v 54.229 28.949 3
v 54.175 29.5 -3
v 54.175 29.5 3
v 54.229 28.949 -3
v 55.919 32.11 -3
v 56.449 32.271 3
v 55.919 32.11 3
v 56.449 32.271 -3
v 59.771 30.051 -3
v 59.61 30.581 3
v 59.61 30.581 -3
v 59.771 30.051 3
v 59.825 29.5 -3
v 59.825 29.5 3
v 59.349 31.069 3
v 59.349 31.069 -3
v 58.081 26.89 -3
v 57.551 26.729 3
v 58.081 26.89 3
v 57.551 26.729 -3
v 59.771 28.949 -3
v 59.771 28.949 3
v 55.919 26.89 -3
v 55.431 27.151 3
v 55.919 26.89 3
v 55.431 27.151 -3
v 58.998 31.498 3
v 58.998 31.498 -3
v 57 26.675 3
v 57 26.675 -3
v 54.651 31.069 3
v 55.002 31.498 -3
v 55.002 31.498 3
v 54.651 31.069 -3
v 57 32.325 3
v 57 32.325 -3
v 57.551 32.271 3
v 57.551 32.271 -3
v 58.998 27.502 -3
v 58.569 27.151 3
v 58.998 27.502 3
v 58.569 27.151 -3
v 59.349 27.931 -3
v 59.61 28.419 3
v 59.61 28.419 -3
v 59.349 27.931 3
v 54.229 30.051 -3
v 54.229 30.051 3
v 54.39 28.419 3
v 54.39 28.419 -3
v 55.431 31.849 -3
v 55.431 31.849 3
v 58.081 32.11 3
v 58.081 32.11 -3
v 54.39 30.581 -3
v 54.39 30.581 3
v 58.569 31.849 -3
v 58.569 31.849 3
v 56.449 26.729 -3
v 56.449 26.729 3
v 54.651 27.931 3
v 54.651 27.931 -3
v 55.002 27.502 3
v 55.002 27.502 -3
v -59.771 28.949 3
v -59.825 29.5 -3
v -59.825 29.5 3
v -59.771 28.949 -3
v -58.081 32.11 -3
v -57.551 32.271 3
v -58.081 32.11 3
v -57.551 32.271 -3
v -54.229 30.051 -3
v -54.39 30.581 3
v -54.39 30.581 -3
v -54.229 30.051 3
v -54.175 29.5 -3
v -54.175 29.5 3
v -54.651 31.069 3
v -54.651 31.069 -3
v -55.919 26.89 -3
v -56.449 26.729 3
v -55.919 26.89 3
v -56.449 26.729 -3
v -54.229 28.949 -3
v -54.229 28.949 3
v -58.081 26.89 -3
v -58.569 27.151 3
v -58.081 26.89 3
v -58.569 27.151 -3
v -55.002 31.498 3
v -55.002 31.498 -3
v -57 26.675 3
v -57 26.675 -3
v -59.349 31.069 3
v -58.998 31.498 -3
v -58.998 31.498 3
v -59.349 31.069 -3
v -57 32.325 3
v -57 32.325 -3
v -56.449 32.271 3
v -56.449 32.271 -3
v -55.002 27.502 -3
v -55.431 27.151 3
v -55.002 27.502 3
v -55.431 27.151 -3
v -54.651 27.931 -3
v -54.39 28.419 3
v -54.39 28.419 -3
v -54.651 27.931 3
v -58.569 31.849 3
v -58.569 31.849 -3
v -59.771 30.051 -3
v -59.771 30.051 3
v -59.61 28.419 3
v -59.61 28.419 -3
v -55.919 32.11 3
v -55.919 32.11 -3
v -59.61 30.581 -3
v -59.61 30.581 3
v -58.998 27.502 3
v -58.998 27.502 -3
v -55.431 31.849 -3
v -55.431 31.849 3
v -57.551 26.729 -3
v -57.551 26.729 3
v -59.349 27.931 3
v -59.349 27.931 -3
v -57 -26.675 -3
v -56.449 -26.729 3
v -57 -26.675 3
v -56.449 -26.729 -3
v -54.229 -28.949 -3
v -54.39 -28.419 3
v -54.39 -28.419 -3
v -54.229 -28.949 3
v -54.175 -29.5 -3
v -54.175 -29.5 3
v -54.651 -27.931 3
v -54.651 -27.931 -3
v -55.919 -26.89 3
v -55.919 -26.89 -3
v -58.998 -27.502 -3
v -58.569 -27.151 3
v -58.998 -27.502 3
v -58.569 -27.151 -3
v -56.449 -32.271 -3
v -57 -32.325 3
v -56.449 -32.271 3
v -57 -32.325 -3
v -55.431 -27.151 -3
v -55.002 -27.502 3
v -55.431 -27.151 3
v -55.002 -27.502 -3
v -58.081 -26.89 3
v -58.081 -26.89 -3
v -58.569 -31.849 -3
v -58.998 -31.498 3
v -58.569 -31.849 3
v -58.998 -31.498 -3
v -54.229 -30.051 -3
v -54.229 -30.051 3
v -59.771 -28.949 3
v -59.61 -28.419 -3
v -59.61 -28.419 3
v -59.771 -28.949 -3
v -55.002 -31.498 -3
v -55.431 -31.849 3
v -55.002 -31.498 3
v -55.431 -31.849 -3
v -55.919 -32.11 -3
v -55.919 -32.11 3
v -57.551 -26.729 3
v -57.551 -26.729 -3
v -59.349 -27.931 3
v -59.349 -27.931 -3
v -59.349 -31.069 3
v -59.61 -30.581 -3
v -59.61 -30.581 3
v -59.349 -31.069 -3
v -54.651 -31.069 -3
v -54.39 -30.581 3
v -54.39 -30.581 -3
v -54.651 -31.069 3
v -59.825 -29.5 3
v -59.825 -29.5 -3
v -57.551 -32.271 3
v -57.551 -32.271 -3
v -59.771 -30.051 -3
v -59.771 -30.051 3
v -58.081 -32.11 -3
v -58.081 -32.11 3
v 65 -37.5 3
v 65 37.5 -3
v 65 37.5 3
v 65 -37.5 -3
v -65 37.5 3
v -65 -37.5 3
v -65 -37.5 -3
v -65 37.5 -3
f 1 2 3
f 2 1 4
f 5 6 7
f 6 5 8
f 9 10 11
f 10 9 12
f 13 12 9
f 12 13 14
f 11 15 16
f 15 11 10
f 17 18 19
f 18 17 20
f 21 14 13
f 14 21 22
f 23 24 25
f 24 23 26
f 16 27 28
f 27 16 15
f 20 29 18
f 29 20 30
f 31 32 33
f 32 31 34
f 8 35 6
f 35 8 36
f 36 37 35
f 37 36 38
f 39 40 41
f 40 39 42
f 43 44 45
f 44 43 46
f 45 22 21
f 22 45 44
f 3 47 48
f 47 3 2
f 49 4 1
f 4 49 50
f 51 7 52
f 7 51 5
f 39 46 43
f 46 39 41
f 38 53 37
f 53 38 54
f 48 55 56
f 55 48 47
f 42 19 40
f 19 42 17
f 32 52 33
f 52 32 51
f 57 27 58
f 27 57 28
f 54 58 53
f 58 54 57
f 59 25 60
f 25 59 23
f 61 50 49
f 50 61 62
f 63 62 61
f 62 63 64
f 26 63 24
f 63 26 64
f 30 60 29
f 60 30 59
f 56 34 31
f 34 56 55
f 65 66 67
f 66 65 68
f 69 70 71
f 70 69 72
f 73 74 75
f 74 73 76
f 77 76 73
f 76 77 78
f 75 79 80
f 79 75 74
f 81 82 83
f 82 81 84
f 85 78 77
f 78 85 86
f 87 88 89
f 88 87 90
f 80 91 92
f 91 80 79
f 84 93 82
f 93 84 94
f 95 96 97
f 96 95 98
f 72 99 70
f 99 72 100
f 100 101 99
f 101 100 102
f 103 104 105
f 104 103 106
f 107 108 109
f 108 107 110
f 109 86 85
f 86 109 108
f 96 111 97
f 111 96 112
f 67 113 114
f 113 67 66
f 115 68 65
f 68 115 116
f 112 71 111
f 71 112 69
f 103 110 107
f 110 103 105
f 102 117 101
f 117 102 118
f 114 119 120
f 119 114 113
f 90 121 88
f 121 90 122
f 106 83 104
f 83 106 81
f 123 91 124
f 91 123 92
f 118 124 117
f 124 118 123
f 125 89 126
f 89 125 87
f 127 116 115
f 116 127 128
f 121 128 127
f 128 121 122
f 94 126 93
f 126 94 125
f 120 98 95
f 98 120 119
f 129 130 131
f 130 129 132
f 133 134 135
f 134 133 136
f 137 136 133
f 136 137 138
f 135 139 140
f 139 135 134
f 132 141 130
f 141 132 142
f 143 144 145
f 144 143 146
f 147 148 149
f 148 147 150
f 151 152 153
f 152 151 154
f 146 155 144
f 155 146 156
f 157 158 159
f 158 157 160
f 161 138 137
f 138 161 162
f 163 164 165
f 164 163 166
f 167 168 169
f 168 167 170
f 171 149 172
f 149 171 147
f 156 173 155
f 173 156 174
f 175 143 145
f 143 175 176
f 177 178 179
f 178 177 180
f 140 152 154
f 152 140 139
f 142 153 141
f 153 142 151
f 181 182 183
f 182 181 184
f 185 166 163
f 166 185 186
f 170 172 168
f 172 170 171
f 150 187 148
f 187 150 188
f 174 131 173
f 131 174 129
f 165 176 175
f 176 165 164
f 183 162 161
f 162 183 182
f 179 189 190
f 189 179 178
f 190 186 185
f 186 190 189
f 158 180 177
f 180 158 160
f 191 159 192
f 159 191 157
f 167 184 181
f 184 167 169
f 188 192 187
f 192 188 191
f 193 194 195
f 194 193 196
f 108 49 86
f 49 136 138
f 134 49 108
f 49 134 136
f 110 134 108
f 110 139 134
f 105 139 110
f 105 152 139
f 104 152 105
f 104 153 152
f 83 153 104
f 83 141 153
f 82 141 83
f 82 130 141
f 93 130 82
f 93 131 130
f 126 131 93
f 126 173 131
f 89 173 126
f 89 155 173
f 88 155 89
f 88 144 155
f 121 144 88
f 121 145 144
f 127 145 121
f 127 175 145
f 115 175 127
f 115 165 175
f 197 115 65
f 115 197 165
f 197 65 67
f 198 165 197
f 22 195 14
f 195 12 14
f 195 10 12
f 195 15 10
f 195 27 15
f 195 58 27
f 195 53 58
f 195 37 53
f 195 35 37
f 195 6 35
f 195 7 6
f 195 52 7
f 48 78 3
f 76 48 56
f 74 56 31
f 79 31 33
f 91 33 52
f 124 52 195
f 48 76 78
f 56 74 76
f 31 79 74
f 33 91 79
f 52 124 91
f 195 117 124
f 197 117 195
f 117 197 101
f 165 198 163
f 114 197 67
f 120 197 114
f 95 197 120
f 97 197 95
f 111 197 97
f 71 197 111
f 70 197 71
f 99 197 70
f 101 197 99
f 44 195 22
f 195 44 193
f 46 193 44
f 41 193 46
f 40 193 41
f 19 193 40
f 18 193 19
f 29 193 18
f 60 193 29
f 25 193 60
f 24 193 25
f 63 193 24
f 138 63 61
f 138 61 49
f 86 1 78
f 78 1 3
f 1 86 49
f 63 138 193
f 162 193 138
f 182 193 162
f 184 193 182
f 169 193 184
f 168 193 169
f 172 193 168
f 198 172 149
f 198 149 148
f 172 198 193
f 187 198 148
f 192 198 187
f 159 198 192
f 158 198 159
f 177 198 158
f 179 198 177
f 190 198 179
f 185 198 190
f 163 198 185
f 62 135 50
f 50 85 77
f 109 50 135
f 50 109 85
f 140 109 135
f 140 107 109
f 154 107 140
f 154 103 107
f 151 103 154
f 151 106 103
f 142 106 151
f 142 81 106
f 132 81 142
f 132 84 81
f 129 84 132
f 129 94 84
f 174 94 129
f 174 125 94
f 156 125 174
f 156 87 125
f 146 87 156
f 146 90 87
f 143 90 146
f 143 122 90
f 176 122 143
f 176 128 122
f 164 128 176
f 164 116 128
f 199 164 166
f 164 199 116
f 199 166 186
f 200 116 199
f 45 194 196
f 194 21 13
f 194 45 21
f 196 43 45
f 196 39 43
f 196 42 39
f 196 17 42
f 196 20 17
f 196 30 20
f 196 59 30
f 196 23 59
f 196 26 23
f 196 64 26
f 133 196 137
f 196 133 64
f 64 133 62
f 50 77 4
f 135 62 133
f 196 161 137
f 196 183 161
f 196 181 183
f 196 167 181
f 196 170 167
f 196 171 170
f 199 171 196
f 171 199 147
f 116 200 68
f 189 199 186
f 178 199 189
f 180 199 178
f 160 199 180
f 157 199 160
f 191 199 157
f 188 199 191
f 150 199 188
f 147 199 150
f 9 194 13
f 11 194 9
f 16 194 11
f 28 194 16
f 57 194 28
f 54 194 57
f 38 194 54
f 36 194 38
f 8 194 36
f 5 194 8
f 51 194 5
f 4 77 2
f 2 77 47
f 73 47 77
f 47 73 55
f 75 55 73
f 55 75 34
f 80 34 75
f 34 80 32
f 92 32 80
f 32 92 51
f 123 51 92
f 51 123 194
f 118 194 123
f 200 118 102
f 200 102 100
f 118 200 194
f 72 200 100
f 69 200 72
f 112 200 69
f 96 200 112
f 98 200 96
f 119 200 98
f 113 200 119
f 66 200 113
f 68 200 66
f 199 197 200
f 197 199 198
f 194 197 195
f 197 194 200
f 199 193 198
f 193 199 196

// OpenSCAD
$fn = 32;

// ----------------------------------------------------------------------
// Corner plate 130 x 75 x 6
// 3 holes, centres taken from the edge offset
// ----------------------------------------------------------------------

// --- parameters (mm) ---
plate = [130, 75, 6];    // overall size (x, y, z)
holes = 3;               // number of holes the drawing asks for
bore_d = 5.5;            // nominal hole diameter from the drawing
print_allowance = 0.15;  // clearance added for printing
edge = 8;                // hole centre offset from the plate edge

// --- derived feature positions (mm) ---
hole_d = bore_d + print_allowance;  // = 5.65   hole diameter as printed
corner_x = plate[0] / 2 - edge;     // = 57   corner hole X
corner_y = plate[1] / 2 - edge;     // = 29.5   corner hole Y
feature_centers = [
  [corner_x, corner_y],
  [-corner_x, corner_y],
  [-corner_x, -corner_y]
];   // hole centres the loop below drills

// plate outline, every hole drilled through with the same cutters
difference() {
  cube(plate, center = true);
  for (centre = feature_centers)
    translate([centre[0], centre[1], 0])
      cylinder(d = hole_d, h = plate[2] + 2, center = true);
}
